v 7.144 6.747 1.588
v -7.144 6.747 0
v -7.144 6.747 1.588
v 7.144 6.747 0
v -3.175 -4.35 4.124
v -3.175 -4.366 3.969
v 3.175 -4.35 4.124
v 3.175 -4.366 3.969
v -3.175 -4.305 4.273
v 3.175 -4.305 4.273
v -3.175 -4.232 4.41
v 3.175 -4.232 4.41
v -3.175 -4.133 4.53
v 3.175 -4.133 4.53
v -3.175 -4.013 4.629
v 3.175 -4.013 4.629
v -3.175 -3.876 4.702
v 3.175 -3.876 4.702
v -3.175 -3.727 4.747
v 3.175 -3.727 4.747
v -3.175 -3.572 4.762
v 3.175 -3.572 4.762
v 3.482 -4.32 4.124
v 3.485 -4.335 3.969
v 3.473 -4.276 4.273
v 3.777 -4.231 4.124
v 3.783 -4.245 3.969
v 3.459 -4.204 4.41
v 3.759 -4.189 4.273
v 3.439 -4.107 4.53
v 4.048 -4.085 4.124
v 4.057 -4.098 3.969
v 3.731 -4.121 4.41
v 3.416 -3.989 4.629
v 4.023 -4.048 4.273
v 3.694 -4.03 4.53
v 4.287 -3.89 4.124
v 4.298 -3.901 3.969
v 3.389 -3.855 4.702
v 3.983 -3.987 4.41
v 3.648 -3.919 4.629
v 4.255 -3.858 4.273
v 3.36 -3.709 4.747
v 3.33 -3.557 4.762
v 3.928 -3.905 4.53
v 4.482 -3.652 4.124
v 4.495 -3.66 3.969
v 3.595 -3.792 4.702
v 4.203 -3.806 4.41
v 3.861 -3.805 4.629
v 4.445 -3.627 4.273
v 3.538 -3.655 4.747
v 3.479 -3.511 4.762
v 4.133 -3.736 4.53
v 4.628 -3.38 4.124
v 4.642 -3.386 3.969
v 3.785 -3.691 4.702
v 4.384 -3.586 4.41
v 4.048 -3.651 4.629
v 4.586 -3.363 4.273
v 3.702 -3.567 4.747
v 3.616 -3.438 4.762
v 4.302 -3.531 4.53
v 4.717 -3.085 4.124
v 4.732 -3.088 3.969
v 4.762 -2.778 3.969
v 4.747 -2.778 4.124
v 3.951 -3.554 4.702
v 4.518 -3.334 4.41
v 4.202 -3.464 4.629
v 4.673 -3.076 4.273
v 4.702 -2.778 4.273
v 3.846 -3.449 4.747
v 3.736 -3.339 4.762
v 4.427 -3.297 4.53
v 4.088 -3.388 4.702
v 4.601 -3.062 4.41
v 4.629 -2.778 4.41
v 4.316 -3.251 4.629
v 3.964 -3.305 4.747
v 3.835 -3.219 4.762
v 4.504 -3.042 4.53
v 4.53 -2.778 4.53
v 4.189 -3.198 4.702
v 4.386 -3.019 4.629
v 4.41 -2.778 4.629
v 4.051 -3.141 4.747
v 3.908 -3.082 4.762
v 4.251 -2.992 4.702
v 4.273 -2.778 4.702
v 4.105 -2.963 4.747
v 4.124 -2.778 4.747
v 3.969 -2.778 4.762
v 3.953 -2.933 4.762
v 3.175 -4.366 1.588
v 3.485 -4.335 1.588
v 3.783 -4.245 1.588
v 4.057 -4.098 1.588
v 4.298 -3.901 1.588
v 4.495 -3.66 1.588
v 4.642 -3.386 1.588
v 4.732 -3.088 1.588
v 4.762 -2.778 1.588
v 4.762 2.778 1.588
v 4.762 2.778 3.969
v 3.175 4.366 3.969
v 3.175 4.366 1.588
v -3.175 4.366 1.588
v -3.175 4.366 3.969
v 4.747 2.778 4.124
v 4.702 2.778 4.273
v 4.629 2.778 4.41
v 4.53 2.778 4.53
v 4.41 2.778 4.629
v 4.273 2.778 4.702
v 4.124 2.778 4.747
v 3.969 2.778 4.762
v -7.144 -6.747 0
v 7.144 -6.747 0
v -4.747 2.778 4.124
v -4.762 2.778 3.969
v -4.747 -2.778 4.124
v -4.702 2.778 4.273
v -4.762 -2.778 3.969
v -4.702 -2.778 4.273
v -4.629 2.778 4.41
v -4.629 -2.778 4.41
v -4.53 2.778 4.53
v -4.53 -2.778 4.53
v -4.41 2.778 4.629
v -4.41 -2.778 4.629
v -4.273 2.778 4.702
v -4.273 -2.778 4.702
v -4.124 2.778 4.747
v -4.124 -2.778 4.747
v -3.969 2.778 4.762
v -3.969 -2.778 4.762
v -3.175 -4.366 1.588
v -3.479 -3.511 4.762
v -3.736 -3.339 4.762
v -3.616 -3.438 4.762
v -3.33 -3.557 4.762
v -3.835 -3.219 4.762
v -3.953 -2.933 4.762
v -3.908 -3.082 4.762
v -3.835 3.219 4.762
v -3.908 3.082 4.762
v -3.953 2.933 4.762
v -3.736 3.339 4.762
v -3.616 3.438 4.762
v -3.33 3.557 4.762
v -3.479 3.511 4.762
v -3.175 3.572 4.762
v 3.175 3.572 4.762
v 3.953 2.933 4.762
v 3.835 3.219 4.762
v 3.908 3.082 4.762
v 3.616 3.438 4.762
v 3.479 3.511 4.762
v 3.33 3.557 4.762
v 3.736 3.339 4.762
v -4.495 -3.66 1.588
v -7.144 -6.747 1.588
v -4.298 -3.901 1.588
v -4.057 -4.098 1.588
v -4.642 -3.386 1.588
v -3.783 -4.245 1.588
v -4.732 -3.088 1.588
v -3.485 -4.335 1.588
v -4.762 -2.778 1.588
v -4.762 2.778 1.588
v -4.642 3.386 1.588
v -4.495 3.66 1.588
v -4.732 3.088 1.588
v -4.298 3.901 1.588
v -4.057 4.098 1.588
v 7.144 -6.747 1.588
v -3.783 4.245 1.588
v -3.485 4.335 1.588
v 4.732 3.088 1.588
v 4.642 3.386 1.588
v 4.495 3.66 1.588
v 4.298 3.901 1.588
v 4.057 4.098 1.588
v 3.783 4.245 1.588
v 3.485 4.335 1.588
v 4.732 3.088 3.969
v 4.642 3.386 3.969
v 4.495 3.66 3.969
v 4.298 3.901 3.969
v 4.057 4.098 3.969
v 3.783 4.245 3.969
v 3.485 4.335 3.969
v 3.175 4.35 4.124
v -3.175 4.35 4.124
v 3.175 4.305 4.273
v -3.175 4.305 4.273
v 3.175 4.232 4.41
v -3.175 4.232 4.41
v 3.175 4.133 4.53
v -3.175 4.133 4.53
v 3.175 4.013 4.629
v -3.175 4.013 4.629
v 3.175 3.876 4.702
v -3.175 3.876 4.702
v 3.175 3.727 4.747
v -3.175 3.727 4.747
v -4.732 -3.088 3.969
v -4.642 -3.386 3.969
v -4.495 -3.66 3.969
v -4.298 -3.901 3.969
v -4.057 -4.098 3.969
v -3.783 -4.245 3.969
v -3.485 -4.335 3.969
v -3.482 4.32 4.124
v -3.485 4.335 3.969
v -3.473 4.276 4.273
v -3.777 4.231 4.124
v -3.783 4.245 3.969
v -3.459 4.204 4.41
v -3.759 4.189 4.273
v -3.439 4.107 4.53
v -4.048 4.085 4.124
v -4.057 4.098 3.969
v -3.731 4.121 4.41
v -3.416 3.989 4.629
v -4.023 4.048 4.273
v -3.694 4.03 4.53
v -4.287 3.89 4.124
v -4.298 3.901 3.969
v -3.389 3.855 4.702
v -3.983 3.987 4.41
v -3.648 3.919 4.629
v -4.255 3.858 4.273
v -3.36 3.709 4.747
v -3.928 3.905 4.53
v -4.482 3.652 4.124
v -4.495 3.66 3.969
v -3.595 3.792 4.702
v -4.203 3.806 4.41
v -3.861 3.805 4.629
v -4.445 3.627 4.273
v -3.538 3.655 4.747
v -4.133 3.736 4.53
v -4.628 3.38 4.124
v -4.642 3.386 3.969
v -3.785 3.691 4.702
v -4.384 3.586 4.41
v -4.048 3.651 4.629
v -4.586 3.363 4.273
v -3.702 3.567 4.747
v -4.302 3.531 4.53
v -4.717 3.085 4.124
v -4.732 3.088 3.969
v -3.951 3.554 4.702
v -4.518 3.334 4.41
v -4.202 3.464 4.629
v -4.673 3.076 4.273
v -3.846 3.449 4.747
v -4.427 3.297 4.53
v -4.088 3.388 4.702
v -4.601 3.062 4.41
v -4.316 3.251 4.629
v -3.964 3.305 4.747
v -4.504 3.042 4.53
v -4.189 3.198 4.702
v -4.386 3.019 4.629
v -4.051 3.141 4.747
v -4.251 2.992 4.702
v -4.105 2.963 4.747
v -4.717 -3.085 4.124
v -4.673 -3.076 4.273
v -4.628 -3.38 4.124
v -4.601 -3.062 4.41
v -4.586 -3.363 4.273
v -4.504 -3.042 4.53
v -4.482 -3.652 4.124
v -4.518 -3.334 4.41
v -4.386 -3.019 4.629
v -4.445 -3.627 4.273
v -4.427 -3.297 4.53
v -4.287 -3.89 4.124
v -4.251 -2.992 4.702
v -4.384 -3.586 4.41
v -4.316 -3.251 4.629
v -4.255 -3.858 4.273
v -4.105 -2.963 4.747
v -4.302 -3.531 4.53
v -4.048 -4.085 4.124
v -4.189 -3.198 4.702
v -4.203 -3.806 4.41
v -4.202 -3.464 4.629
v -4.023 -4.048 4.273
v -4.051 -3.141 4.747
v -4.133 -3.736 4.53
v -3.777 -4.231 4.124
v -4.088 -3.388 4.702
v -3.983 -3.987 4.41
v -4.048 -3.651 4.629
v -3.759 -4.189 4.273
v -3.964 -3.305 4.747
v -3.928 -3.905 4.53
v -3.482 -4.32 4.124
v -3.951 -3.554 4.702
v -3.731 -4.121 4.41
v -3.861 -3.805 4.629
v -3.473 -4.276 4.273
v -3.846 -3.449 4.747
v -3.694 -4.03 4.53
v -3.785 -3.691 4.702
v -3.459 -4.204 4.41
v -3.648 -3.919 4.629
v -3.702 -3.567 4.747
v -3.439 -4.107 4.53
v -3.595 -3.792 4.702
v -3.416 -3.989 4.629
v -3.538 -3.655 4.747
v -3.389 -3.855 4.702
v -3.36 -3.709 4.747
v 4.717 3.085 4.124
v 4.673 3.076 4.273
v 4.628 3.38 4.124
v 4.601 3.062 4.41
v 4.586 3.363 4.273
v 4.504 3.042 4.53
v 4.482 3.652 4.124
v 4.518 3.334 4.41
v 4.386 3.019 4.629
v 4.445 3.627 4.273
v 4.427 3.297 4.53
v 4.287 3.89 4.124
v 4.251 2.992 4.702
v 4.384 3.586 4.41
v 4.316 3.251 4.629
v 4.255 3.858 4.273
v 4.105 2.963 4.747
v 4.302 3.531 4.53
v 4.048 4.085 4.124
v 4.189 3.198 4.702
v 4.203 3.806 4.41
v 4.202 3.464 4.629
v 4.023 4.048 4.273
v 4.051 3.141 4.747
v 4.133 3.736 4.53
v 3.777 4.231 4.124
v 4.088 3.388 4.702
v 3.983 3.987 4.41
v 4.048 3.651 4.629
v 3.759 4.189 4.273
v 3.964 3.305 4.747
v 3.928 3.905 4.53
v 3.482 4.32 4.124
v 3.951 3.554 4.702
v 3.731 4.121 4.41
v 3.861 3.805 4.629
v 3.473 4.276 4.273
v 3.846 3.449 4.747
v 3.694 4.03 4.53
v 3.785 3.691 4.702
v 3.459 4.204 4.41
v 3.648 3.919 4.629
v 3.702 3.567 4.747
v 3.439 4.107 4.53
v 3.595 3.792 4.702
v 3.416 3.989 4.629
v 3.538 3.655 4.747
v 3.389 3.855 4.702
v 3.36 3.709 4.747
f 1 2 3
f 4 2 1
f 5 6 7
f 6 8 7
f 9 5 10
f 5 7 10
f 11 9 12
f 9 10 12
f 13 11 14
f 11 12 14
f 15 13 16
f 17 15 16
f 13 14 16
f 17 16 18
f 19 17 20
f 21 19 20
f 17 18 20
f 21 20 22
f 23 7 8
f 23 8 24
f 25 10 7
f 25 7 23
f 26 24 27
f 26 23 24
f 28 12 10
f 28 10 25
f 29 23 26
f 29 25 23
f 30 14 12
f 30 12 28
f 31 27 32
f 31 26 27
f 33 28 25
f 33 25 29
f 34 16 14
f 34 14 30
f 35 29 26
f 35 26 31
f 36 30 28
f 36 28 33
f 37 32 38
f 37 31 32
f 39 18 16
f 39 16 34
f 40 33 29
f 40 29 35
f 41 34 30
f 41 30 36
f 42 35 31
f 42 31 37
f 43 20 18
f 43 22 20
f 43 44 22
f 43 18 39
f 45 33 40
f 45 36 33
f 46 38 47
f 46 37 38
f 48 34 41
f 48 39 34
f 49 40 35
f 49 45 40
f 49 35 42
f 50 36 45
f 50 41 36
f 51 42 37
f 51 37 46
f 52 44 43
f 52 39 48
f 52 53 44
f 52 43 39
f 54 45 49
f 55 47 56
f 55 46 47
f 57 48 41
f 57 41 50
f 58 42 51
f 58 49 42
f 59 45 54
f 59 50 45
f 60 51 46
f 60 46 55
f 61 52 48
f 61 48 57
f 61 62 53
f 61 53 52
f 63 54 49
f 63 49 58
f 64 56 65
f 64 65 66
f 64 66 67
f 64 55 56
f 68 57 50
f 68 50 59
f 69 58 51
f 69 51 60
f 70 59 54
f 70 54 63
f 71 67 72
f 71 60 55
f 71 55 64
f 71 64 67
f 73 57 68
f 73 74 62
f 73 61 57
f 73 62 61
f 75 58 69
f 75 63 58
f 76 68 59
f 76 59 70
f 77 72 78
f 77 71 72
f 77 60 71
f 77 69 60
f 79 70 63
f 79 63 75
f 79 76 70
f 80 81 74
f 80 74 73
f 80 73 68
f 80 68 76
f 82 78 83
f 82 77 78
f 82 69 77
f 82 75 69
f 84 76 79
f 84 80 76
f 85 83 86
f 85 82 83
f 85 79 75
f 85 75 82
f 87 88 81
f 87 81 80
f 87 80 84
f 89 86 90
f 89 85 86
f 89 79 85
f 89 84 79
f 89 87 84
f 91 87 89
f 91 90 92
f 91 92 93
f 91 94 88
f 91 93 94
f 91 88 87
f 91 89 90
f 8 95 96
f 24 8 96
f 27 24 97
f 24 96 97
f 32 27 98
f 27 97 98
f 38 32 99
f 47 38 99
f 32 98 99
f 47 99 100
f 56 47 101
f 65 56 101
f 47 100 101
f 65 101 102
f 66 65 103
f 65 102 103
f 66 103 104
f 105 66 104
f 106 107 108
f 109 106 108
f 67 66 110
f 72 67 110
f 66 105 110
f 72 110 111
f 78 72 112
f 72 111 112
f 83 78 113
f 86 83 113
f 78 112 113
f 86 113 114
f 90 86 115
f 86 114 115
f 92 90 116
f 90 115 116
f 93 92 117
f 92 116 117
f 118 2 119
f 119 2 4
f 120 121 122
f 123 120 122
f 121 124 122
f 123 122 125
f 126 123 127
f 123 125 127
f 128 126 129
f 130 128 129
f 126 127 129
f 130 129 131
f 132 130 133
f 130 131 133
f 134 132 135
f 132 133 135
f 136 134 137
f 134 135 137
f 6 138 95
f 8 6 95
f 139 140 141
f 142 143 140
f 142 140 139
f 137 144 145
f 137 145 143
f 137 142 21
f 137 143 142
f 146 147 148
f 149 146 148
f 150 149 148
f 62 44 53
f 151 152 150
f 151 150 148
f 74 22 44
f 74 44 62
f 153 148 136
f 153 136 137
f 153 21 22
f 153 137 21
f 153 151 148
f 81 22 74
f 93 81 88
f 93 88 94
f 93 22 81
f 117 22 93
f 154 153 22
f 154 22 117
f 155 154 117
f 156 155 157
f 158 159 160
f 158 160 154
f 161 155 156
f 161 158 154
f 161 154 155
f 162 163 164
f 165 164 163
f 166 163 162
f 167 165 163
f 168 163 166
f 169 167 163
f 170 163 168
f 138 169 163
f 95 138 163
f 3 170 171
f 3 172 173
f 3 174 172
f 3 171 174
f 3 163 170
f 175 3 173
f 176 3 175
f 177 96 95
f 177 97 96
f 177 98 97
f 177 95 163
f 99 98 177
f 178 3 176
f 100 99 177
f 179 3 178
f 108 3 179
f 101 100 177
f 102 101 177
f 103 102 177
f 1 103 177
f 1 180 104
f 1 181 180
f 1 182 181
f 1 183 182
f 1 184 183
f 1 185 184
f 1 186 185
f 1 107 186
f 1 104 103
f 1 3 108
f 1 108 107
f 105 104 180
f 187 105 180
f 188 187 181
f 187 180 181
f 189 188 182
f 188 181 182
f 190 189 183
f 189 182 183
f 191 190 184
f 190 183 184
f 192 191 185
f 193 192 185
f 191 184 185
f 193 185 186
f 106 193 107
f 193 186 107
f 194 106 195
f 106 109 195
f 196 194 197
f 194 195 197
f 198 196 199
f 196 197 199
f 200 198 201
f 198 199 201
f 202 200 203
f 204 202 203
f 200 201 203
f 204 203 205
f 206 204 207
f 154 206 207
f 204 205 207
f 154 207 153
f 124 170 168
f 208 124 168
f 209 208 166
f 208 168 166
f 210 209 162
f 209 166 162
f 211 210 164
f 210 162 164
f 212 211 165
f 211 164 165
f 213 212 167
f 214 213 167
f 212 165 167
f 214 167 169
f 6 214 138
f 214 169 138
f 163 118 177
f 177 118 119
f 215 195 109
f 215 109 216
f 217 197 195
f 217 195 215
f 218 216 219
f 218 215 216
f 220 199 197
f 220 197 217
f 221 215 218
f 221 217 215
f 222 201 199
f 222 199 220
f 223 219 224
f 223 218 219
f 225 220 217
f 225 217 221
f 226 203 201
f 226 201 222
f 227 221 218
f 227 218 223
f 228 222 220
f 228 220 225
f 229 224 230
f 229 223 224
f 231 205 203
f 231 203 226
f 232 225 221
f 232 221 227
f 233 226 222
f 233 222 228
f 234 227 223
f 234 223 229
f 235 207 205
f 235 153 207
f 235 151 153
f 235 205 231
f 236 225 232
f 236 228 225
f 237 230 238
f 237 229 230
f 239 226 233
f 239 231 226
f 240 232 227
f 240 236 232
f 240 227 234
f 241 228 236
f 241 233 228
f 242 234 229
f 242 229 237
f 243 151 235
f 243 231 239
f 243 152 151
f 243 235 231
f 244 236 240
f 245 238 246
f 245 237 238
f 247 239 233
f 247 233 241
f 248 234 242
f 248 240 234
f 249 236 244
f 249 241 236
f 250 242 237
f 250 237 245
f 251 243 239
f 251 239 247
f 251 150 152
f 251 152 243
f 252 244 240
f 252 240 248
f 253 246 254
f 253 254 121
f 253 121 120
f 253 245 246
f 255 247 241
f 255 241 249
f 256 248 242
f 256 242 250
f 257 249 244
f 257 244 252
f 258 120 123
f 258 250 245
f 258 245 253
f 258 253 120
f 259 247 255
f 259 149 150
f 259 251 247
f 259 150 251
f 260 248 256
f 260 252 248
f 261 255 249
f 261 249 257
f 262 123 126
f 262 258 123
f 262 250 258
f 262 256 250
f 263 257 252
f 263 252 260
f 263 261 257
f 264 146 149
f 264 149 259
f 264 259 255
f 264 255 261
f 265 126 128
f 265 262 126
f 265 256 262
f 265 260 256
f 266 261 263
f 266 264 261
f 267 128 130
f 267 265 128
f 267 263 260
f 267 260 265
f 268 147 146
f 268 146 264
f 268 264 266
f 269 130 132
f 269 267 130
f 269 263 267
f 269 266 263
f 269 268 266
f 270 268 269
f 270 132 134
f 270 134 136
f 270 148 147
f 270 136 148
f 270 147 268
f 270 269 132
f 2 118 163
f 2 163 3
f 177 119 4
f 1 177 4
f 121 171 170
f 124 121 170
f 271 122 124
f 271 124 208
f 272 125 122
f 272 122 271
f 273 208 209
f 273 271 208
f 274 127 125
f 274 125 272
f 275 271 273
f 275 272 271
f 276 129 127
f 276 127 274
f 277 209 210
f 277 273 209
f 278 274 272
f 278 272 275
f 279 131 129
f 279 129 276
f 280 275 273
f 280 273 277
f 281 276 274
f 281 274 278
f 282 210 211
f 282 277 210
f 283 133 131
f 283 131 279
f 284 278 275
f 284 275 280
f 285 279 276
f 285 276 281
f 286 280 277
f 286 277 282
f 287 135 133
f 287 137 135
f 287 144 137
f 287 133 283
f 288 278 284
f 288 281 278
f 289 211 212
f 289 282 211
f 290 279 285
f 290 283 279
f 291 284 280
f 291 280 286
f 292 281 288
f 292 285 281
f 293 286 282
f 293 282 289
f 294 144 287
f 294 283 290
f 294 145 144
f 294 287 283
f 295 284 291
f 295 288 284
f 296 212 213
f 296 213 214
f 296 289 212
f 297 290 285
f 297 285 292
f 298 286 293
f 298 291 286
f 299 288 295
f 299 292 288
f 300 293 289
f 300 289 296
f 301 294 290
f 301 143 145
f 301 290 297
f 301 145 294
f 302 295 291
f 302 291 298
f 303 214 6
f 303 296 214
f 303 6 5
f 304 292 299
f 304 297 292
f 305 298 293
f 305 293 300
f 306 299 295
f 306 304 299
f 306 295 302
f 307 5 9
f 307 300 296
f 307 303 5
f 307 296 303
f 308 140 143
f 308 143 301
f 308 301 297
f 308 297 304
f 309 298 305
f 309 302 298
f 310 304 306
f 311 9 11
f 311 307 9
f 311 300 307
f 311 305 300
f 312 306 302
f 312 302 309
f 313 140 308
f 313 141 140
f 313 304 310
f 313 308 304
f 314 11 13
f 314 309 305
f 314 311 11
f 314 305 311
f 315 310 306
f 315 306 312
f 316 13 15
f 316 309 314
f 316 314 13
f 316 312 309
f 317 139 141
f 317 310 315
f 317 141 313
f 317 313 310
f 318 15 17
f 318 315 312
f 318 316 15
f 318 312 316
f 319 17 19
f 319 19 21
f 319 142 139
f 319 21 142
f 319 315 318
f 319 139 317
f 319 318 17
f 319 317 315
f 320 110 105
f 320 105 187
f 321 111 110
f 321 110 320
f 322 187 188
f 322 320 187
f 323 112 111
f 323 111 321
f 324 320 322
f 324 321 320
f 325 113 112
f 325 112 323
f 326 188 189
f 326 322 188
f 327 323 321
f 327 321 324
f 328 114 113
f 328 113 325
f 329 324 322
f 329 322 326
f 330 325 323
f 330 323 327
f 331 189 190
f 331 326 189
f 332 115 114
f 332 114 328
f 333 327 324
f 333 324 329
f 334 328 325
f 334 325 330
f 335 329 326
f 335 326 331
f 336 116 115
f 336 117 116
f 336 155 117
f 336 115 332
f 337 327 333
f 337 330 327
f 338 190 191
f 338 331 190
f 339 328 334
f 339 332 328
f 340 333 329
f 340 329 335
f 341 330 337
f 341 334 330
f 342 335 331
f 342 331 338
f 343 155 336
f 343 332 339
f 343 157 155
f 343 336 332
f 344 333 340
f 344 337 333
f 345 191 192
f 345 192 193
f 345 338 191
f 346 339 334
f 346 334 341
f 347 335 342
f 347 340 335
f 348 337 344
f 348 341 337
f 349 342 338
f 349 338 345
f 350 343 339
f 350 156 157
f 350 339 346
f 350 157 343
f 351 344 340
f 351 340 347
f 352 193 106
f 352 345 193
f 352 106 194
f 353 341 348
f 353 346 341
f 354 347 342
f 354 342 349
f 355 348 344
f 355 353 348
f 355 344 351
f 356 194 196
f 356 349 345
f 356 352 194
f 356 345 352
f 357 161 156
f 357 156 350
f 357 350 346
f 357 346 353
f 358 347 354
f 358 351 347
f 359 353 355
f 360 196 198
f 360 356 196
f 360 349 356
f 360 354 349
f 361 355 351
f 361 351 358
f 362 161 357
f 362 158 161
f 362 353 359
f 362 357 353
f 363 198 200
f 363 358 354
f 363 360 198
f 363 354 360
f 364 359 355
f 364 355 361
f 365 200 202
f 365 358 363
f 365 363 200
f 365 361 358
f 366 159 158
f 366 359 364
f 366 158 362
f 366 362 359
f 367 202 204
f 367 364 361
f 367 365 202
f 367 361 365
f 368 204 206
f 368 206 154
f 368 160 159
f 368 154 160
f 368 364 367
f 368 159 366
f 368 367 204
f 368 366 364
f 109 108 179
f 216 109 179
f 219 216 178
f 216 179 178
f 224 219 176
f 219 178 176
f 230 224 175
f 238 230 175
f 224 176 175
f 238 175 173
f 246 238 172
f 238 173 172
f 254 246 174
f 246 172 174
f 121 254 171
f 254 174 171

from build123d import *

# Parameters (mm, degrees)
F0_W     = 14.2875
F0_H     = 13.49375
F1_DEPTH = 1.5875
F3_DEPTH = 3.175
F4_R     = 0.79375


with BuildPart() as f1:
    # F0 (on Top) → F1 (new body)
    with BuildSketch(Plane.XY):
        Rectangle(F0_W, F0_H)
        with BuildLine():
            ThreePointArc((4.7625, -2.778125), (4.297532, -3.900657), (3.175, -4.365625))
            Line((3.175, -4.365625), (-3.175, -4.365625))
            ThreePointArc((-3.175, -4.365625), (-4.297532, -3.900657), (-4.7625, -2.778125))
            Line((-4.7625, -2.778125), (-4.7625, 2.778125))
            ThreePointArc((-4.7625, 2.778125), (-4.297532, 3.900657), (-3.175, 4.365625))
            Line((-3.175, 4.365625), (3.175, 4.365625))
            ThreePointArc((3.175, 4.365625), (4.297532, 3.900657), (4.7625, 2.778125))
            Line((4.7625, 2.778125), (4.7625, -2.778125))
        make_face(mode=Mode.SUBTRACT)
        with BuildLine():
            Line((-3.175, -4.365625), (3.175, -4.365625))
            ThreePointArc((3.175, -4.365625), (4.297532, -3.900657), (4.7625, -2.778125))
            Line((4.7625, -2.778125), (4.7625, 2.778125))
            ThreePointArc((4.7625, 2.778125), (4.297532, 3.900657), (3.175, 4.365625))
            Line((3.175, 4.365625), (-3.175, 4.365625))
            ThreePointArc((-3.175, 4.365625), (-4.297532, 3.900657), (-4.7625, 2.778125))
            Line((-4.7625, 2.778125), (-4.7625, -2.778125))
            ThreePointArc((-4.7625, -2.778125), (-4.297532, -3.900657), (-3.175, -4.365625))
        make_face()
    extrude(amount=F1_DEPTH)

    # F2 (on face) → F3 (join)
    with BuildSketch(Plane.XY.offset(1.5875)):
        with BuildLine():
            ThreePointArc((4.7625, 2.778125), (4.297532, 3.900657), (3.175, 4.365625))
            Line((3.175, 4.365625), (-3.175, 4.365625))
            ThreePointArc((-3.175, 4.365625), (-4.297532, 3.900657), (-4.7625, 2.778125))
            Line((-4.7625, 2.778125), (-4.7625, -2.778125))
            ThreePointArc((-4.7625, -2.778125), (-4.297532, -3.900657), (-3.175, -4.365625))
            Line((-3.175, -4.365625), (3.175, -4.365625))
            ThreePointArc((3.175, -4.365625), (4.297532, -3.900657), (4.7625, -2.778125))
            Line((4.7625, -2.778125), (4.7625, 2.778125))
        make_face()
    extrude(amount=F3_DEPTH)

    # F4
    f4_edges = [f1.edges().sort_by_distance(p)[0] for p in [
        (4.7625, 0, 4.7625),
    ]]
    fillet(f4_edges, radius=F4_R)


solid = f1.part
